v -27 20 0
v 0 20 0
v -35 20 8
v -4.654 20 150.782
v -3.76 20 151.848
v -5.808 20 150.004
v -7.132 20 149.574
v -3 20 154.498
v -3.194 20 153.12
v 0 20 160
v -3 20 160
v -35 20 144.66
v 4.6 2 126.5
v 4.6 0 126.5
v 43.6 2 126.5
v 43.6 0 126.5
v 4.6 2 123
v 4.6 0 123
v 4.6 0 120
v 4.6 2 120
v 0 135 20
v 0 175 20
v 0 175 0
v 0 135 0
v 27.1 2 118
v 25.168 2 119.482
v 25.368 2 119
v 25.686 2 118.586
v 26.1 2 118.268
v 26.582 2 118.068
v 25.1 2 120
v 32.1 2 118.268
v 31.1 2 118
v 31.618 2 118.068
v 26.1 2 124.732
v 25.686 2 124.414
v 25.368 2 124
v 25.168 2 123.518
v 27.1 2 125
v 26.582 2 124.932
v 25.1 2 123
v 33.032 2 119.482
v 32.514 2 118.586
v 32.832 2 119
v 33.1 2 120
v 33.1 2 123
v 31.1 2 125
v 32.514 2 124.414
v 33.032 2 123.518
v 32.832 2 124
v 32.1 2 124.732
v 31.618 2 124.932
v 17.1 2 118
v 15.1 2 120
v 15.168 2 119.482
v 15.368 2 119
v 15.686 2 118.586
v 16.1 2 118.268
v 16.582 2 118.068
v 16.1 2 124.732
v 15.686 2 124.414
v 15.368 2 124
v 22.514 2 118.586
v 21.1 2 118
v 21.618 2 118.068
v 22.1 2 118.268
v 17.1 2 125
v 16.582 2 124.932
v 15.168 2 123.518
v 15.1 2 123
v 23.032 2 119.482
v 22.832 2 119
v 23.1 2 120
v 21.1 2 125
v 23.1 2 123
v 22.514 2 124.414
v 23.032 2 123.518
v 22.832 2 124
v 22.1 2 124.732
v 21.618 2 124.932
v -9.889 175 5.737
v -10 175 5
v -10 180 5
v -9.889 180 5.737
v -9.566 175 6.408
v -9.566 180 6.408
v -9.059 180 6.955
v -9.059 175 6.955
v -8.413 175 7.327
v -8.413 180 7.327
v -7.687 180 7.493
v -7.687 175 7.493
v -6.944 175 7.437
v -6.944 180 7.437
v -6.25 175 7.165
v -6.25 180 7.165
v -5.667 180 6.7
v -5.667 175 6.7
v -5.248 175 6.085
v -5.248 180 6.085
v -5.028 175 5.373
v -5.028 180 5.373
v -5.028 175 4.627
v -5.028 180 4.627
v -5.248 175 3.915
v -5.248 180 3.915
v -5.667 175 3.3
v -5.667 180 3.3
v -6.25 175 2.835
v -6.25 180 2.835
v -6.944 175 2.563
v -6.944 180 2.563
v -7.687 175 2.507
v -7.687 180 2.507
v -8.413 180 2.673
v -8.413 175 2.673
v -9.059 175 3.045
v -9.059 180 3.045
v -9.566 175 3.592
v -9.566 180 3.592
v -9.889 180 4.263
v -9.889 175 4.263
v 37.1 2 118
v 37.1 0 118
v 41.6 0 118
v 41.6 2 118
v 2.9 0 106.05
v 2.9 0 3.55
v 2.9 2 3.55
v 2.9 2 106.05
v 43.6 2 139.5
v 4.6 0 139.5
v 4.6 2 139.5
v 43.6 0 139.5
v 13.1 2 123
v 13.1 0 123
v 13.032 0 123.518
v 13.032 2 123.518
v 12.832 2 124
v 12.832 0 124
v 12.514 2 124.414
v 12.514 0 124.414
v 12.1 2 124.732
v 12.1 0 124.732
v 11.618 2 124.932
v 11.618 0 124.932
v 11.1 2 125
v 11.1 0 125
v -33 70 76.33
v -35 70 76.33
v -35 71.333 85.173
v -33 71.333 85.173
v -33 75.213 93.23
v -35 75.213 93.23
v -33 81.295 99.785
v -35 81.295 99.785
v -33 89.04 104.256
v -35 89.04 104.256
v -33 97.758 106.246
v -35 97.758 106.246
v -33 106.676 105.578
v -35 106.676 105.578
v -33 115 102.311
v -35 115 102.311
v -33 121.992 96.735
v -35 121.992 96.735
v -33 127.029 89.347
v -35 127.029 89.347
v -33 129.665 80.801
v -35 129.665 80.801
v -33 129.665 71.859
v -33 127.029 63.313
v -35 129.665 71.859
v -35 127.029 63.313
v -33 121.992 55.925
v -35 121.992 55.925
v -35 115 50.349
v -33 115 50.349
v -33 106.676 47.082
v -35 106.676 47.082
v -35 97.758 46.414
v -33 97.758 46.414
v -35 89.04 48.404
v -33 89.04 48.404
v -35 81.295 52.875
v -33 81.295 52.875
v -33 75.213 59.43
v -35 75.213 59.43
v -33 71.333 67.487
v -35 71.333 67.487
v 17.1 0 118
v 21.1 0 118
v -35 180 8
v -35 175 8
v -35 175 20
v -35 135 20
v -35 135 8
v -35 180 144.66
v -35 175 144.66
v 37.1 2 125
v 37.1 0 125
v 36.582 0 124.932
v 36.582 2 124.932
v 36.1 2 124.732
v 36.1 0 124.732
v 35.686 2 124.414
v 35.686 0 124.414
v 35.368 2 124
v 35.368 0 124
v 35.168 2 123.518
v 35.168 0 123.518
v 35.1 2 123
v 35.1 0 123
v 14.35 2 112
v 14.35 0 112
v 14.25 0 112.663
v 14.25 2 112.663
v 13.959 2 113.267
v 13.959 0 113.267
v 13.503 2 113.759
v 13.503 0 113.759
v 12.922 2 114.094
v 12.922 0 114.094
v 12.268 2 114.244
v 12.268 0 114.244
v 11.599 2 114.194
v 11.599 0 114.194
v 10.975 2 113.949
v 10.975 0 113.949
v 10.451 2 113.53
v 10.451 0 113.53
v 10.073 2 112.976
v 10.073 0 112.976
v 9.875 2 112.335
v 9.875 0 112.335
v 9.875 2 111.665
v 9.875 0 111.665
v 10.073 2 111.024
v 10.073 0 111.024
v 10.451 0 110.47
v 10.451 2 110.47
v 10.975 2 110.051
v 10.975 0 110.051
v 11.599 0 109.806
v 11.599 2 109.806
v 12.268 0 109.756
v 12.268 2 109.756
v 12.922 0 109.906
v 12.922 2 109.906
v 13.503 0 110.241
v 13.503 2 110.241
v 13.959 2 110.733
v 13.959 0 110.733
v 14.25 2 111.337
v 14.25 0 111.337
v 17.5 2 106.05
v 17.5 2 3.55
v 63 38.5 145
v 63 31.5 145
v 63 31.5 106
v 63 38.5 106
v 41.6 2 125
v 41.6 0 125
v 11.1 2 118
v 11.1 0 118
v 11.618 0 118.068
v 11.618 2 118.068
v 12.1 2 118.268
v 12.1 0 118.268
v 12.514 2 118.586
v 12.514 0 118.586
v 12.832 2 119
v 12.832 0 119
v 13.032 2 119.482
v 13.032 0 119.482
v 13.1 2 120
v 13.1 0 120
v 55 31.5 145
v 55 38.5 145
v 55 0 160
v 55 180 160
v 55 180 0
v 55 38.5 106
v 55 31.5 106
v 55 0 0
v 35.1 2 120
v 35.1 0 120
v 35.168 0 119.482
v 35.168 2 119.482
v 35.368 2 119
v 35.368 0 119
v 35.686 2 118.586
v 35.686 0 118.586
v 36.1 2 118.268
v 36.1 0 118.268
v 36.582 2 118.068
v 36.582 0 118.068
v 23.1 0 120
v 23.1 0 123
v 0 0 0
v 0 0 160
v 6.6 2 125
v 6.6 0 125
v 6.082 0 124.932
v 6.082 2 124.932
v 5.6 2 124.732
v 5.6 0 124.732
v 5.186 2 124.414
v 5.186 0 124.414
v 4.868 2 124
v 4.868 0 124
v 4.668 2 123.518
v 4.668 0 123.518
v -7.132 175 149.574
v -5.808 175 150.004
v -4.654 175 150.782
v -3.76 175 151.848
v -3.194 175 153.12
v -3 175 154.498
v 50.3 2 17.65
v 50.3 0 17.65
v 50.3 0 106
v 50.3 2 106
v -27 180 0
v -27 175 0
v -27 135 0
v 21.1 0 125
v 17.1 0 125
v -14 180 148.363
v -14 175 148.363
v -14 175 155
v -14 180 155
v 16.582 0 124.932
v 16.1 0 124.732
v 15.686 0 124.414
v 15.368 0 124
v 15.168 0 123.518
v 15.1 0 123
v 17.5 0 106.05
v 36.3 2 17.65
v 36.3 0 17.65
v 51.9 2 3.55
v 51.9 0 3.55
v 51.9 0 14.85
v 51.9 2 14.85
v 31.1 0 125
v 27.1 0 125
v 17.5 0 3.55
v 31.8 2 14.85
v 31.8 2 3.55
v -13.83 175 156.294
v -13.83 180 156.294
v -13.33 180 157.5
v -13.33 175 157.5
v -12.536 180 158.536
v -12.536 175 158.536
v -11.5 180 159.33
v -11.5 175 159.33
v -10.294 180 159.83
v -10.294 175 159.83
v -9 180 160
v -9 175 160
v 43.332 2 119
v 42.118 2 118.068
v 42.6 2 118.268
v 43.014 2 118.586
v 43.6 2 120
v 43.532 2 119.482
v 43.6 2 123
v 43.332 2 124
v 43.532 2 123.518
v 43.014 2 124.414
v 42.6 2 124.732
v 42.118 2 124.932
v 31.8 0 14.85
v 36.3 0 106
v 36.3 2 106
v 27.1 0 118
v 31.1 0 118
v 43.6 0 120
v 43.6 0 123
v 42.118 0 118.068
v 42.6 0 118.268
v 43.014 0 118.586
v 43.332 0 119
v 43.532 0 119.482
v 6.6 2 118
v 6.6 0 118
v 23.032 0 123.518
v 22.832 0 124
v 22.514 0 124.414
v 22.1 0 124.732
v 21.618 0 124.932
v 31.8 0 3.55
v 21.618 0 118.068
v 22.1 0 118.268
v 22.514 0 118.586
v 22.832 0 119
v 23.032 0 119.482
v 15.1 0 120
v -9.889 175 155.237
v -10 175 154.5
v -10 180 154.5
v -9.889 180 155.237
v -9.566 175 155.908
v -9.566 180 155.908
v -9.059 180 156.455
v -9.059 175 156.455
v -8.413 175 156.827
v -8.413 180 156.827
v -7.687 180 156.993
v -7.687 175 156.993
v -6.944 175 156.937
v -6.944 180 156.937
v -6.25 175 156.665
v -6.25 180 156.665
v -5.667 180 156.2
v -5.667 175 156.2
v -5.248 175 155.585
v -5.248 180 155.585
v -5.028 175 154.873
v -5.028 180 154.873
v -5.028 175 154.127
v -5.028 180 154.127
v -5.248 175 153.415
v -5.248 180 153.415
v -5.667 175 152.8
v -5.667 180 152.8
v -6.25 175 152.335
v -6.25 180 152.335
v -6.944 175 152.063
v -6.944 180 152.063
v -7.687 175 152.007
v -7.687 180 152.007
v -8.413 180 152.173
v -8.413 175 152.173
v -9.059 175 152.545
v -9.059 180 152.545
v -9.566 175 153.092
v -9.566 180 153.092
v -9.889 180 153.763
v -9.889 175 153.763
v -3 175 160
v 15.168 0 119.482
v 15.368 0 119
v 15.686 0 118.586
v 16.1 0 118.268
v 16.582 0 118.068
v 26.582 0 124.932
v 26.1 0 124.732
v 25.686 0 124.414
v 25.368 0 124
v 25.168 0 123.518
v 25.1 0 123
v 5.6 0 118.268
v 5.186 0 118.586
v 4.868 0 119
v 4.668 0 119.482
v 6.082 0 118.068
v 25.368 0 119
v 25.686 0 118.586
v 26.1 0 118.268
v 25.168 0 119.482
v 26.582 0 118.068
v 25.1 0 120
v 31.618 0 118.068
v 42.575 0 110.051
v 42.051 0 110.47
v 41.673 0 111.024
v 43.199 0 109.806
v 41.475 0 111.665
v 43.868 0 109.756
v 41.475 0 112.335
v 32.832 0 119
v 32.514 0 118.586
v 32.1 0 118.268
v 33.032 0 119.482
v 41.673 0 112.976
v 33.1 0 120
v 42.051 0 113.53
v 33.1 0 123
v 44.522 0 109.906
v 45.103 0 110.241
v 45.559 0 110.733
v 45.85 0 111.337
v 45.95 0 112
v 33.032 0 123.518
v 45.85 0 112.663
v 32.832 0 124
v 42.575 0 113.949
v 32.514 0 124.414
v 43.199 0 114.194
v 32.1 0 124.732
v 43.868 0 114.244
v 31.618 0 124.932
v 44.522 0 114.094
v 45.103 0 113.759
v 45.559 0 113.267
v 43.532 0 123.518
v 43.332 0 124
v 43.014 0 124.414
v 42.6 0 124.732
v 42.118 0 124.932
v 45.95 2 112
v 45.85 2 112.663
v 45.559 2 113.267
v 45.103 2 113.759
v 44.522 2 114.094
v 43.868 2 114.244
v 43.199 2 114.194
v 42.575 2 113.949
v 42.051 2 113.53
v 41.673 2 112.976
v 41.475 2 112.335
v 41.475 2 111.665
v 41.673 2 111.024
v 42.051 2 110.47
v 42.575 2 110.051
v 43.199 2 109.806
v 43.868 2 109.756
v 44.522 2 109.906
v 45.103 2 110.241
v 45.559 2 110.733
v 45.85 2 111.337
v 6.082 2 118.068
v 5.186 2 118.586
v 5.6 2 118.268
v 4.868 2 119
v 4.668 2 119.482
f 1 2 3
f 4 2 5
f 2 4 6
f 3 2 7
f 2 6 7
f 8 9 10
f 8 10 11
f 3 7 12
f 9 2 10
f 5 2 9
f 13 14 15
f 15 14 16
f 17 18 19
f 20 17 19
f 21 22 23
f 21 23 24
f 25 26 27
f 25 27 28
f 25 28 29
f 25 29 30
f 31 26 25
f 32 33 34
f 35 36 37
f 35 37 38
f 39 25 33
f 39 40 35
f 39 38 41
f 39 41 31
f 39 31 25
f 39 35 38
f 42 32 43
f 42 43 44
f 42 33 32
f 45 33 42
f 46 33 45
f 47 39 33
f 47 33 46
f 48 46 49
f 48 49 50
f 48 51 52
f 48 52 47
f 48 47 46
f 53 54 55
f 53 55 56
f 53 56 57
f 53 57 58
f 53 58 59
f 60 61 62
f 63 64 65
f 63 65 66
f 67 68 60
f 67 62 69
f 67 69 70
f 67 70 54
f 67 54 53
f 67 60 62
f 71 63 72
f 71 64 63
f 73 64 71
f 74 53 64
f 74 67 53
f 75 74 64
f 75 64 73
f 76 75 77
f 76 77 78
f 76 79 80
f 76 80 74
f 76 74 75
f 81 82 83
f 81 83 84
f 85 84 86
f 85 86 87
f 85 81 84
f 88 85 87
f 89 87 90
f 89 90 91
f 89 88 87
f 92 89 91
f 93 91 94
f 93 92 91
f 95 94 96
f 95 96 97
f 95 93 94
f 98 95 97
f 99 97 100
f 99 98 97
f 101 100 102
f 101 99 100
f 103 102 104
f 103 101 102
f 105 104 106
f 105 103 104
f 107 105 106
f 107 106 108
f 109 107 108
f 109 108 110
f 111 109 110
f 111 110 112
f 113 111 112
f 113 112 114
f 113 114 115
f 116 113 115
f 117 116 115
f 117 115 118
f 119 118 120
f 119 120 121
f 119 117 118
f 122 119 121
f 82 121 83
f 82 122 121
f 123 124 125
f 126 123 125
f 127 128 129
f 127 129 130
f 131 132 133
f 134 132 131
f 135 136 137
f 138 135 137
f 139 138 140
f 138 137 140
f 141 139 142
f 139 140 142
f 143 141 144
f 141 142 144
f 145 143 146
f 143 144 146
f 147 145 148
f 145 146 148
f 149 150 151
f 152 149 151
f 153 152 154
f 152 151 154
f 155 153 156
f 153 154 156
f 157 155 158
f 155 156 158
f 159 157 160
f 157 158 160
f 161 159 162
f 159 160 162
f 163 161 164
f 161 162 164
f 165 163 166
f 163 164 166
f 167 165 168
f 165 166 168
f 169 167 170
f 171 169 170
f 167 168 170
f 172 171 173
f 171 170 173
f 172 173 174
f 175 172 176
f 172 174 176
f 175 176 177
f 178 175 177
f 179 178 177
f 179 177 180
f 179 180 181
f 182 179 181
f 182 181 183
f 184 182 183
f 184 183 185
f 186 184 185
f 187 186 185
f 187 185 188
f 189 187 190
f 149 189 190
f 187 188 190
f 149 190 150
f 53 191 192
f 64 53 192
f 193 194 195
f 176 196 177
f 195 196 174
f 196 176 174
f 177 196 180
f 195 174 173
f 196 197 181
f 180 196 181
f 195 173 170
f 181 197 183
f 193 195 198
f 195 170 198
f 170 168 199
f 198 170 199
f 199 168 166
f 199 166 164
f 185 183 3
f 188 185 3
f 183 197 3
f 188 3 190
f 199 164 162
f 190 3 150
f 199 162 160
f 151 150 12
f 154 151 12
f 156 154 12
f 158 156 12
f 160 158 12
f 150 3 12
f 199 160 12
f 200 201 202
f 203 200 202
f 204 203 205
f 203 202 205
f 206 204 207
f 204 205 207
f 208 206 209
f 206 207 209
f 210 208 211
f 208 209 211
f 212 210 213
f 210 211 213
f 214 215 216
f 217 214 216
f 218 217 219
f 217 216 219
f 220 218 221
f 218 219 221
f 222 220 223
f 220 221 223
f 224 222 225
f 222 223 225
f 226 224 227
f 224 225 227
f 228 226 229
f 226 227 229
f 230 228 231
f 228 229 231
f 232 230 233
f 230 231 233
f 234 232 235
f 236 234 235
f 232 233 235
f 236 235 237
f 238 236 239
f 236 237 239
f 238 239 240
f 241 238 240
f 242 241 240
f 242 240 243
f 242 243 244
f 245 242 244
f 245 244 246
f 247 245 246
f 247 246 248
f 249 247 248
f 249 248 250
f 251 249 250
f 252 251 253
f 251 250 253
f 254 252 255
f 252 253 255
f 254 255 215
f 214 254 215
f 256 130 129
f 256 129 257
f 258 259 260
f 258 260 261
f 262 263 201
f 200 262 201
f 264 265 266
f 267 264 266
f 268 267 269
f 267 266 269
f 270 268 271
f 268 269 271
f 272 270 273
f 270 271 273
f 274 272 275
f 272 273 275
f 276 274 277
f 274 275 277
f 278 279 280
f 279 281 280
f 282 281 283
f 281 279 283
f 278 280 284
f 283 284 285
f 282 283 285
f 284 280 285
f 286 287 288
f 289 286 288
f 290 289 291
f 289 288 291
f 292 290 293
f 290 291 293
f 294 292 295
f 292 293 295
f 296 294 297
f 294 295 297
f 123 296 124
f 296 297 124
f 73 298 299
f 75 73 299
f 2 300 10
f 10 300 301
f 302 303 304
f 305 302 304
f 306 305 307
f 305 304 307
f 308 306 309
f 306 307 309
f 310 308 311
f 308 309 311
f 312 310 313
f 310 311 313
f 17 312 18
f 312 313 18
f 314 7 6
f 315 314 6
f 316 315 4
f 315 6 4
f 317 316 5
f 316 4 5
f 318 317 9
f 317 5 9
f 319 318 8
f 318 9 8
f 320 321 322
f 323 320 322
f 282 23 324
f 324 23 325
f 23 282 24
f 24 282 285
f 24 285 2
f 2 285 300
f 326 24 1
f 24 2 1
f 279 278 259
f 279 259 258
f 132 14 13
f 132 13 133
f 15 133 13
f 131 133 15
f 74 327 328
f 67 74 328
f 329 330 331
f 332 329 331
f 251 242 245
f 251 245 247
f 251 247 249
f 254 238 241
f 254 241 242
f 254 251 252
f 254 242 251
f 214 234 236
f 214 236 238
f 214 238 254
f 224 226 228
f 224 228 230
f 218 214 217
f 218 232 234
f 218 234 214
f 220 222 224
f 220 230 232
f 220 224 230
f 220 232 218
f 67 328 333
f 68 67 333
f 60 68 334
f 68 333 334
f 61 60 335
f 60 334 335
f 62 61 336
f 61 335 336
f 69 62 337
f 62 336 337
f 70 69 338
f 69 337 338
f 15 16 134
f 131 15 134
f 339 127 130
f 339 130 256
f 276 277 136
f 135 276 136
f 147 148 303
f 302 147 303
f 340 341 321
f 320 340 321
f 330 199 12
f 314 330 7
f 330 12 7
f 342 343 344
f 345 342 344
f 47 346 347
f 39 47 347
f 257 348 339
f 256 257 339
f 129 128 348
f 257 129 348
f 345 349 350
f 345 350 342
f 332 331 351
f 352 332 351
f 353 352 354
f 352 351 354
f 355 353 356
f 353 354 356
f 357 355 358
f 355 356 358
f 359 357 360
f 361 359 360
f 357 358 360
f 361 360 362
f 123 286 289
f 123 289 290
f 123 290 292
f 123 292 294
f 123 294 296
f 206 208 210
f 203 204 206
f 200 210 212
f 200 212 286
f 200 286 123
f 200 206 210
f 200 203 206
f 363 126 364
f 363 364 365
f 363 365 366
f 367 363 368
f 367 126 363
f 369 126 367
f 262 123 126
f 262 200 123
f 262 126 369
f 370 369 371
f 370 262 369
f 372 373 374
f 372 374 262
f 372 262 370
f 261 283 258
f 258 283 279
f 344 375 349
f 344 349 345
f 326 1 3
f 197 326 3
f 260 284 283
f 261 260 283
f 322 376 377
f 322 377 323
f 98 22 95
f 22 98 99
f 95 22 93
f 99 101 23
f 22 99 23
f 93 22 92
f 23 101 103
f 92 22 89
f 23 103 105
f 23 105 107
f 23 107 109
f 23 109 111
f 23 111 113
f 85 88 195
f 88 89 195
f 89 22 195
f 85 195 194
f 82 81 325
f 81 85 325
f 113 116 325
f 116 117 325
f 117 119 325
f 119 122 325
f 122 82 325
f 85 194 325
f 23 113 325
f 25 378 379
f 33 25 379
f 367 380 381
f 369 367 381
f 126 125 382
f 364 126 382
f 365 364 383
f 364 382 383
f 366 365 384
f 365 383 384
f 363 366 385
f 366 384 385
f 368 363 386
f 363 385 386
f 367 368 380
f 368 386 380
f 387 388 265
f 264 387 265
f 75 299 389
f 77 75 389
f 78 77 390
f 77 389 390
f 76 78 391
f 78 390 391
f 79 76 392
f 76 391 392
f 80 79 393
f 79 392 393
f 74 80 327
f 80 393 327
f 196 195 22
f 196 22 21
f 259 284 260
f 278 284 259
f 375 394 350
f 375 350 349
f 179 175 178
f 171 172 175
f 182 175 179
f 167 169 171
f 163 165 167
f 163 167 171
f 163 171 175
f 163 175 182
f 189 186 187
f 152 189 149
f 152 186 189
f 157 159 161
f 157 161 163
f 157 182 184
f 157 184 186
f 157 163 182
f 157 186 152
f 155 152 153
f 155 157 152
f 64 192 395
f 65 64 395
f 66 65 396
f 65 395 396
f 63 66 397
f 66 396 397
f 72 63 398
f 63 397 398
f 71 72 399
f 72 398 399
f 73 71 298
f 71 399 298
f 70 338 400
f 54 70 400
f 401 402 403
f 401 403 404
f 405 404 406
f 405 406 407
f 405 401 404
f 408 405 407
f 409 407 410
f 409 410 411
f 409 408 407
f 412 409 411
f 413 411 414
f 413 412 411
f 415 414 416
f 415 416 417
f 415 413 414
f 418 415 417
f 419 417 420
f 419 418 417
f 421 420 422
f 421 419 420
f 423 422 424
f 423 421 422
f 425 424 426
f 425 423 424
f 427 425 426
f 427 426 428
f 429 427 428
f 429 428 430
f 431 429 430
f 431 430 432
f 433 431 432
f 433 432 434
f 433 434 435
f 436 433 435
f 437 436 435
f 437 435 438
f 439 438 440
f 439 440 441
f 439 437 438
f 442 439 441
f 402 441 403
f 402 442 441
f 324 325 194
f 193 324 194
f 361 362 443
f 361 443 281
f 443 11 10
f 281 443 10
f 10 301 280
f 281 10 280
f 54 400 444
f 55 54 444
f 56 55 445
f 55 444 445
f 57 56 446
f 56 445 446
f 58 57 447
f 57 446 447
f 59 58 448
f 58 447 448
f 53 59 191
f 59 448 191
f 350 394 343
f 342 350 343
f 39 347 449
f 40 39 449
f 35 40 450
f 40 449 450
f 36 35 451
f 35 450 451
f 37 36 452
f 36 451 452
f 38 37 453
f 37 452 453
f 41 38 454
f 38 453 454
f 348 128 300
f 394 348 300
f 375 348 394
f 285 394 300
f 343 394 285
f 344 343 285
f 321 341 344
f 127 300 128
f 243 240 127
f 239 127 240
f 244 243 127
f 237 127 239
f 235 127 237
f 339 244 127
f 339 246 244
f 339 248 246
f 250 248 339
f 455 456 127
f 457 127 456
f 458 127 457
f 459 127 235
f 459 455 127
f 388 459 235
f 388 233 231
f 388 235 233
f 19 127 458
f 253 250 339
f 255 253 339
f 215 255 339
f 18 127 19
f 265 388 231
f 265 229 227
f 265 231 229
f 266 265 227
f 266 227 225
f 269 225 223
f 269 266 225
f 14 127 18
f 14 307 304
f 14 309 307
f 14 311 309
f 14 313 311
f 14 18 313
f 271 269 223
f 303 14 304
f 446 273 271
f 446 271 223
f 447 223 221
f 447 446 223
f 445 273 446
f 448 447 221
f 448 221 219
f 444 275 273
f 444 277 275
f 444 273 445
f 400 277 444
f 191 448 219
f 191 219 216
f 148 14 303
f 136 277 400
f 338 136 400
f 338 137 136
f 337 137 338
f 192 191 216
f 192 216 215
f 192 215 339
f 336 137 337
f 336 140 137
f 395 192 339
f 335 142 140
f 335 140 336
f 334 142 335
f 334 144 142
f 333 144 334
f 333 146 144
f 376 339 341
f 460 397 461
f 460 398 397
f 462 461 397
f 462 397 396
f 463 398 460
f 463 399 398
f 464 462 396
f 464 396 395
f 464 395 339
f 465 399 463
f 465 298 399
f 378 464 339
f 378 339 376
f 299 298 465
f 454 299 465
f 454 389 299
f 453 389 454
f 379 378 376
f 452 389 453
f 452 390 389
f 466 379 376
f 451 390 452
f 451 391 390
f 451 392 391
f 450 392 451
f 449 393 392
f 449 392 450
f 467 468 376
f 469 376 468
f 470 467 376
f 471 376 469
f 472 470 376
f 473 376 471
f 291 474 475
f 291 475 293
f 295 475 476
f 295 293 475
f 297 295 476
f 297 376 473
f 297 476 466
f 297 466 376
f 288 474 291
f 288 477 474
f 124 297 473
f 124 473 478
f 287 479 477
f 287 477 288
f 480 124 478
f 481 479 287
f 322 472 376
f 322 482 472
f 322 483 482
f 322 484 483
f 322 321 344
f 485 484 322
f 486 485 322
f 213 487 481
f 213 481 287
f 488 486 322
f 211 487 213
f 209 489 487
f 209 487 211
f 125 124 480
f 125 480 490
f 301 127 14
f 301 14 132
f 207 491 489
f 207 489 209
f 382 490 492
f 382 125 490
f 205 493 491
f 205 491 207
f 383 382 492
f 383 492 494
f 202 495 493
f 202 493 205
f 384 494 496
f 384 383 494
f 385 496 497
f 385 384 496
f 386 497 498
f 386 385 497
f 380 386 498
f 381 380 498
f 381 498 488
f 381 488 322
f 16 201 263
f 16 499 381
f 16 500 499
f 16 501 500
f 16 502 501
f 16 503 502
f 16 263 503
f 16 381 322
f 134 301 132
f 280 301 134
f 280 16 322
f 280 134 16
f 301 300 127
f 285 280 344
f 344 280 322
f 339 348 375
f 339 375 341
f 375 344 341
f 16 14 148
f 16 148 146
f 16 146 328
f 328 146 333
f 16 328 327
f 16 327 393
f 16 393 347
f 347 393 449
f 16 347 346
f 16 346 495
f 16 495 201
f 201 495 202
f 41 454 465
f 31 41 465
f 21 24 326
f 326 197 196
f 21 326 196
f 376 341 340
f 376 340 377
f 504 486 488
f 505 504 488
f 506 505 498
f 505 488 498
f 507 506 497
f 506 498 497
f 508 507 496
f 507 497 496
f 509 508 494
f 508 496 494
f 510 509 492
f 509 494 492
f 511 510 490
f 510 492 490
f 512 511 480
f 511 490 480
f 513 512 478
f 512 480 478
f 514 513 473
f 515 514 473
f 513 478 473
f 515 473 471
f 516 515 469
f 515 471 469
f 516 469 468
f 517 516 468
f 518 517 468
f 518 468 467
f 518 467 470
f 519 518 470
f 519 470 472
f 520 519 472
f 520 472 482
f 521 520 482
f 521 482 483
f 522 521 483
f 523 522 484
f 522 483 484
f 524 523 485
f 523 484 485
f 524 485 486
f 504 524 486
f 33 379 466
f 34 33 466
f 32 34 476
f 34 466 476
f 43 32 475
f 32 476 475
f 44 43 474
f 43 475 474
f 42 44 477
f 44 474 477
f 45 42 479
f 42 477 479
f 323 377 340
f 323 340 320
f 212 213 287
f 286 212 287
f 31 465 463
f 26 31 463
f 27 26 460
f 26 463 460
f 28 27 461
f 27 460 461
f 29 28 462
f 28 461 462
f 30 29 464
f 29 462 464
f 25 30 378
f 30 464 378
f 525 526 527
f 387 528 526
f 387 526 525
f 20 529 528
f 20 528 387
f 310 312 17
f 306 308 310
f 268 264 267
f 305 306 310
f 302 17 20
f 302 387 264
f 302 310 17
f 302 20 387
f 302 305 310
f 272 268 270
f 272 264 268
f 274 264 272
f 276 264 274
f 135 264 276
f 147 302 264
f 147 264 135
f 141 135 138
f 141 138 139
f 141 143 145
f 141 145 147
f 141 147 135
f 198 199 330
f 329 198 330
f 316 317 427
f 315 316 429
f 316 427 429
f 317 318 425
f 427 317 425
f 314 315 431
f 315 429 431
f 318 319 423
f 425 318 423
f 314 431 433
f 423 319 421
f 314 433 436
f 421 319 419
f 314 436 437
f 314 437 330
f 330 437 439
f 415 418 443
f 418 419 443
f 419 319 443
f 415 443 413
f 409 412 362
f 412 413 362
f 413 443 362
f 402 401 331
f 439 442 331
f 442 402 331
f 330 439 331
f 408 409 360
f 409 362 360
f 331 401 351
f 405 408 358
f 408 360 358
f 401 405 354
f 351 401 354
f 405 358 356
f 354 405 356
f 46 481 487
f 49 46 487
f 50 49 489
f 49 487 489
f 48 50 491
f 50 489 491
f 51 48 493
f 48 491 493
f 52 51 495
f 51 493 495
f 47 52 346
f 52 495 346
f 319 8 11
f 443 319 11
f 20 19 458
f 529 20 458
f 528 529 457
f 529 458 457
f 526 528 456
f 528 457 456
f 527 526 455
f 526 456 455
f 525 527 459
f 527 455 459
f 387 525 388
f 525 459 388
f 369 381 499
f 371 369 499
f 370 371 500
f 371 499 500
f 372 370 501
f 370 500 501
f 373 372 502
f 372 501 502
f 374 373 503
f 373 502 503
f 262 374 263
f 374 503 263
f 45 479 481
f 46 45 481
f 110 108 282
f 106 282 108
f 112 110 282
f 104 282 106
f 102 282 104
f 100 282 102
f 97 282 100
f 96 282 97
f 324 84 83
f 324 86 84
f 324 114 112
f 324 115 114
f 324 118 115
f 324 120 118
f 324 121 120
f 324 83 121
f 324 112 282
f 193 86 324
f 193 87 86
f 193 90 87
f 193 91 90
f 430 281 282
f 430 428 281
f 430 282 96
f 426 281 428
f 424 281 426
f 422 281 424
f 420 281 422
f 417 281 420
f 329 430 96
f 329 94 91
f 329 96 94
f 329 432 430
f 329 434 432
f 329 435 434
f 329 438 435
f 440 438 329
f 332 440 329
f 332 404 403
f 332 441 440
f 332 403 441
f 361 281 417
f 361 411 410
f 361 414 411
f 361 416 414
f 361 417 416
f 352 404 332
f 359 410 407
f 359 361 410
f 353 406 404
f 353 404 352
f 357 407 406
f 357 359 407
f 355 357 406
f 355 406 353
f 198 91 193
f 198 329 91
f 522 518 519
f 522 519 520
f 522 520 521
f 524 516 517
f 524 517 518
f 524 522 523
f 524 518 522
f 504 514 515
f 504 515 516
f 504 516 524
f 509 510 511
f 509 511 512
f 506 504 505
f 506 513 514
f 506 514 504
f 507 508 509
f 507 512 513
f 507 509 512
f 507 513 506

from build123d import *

# Parameters (mm, degrees)
F0_W      = 55
F0_H      = 160
F1_DEPTH  = 20
F2_W      = 55
F2_H      = 160
F3_DEPTH  = 155
F4_R      = 2.5
F5_DEPTH  = 5
F6_W      = 7
F6_H      = 39
F7_DEPTH  = 8
F8_W      = 14.6
F8_H      = 102.5
F8_W_2    = 14
F8_H_2    = 88.35
F8_W_3    = 20.1
F8_H_3    = 11.3
F8_W_4    = 39
F8_H_4    = 13
F8_R      = 2.25
F9_DEPTH  = 2
F10_W     = 40
F10_H     = 12
F10_H_2   = 8
F11_DEPTH = 35
F12_R     = 30
F13_DEPTH = 2


with BuildPart() as f1:
    # F0 (on Front) → F1 (new body)
    with BuildSketch(Plane.XZ):
        with Locations((27.5, 80)):
            Rectangle(F0_W, F0_H)
    extrude(amount=-F1_DEPTH)

    # F2 (on face) → F3 (join)
    with BuildSketch(Plane(origin=(0, 20, 0), x_dir=(-1, 0, 0), z_dir=(0, 1, 0))):
        with BuildLine():
            Line((3, 160), (0, 160))
            Line((0, 160), (0, 0))
            Line((0, 0), (27, 0))
            Line((27, 0), (35, 8))
            Line((35, 8), (35, 144.66))
            Line((35, 144.66), (7.131759, 149.573923))
            ThreePointArc((7.131759, 149.573923), (4.169778, 151.284023), (3, 154.497962))
            Line((3, 154.497962), (3, 160))
        make_face()
        with Locations((-27.5, 80)):
            Rectangle(F2_W, F2_H)
    extrude(amount=F3_DEPTH)

    # F4 (on face) → F5 (join)
    with BuildSketch(Plane(origin=(0, 175, 0), x_dir=(-1, 0, 0), z_dir=(0, 1, 0))):
        with BuildLine():
            Line((9, 160), (3, 160))
            Line((3, 160), (3, 154.497962))
            ThreePointArc((3, 154.497962), (4.169778, 151.284023), (7.131759, 149.573923))
            Line((7.131759, 149.573923), (14, 148.362867))
            Line((14, 148.362867), (14, 155))
            ThreePointArc((14, 155), (12.535534, 158.535534), (9, 160))
        make_face()
        with Locations((7.5, 154.5)):
            Circle(F4_R, mode=Mode.SUBTRACT)
        with BuildLine():
            Line((3, 160), (-55, 160))
            Line((-55, 160), (-55, 0))
            Line((-55, 0), (27, 0))
            Line((27, 0), (35, 8))
            Line((35, 8), (35, 144.66))
            Line((35, 144.66), (14, 148.362867))
            Line((14, 148.362867), (7.131759, 149.573923))
            ThreePointArc((7.131759, 149.573923), (4.169778, 151.284023), (3, 154.497962))
            Line((3, 154.497962), (3, 160))
        make_face()
        with Locations((7.5, 5)):
            Circle(F4_R, mode=Mode.SUBTRACT)
    extrude(amount=F5_DEPTH)

    # F6 (on face) → F7 (join)
    with BuildSketch(Plane.YZ.offset(55)):
        with Locations((35, 125.5)):
            Rectangle(F6_W, F6_H)
    extrude(amount=F7_DEPTH)

    # F8 (on face) → F9 (cut)
    with BuildSketch(Plane.XZ):
        with Locations((10.2, 54.8)):
            Rectangle(F8_W, F8_H)
        with Locations((43.3, 61.825)):
            Rectangle(F8_W_2, F8_H_2)
        with Locations((41.85, 9.2)):
            Rectangle(F8_W_3, F8_H_3)
        with Locations((24.1, 133)):
            Rectangle(F8_W_4, F8_H_4)
        with BuildLine():
            Line((11.1, 125), (6.6, 125))
            ThreePointArc((6.6, 125), (5.185786, 124.414214), (4.6, 123))
            Line((4.6, 123), (4.6, 120))
            ThreePointArc((4.6, 120), (5.185786, 118.585786), (6.6, 118))
            Line((6.6, 118), (11.1, 118))
            ThreePointArc((11.1, 118), (12.514214, 118.585786), (13.1, 120))
            Line((13.1, 120), (13.1, 123))
            ThreePointArc((13.1, 123), (12.514214, 124.414214), (11.1, 125))
        make_face()
        with BuildLine():
            ThreePointArc((15.1, 120), (15.685786, 118.585786), (17.1, 118))
            Line((17.1, 118), (21.1, 118))
            ThreePointArc((21.1, 118), (22.514214, 118.585786), (23.1, 120))
            Line((23.1, 120), (23.1, 123))
            ThreePointArc((23.1, 123), (22.514214, 124.414214), (21.1, 125))
            Line((21.1, 125), (17.1, 125))
            ThreePointArc((17.1, 125), (15.685786, 124.414214), (15.1, 123))
            Line((15.1, 123), (15.1, 120))
        make_face()
        with BuildLine():
            ThreePointArc((25.1, 120), (25.685786, 118.585786), (27.1, 118))
            Line((27.1, 118), (31.1, 118))
            ThreePointArc((31.1, 118), (32.514214, 118.585786), (33.1, 120))
            Line((33.1, 120), (33.1, 123))
            ThreePointArc((33.1, 123), (32.514214, 124.414214), (31.1, 125))
            Line((31.1, 125), (27.1, 125))
            ThreePointArc((27.1, 125), (25.685786, 124.414214), (25.1, 123))
            Line((25.1, 123), (25.1, 120))
        make_face()
        with BuildLine():
            ThreePointArc((35.1, 120), (35.685786, 118.585786), (37.1, 118))
            Line((37.1, 118), (41.6, 118))
            ThreePointArc((41.6, 118), (43.014214, 118.585786), (43.6, 120))
            Line((43.6, 120), (43.6, 123))
            ThreePointArc((43.6, 123), (43.014214, 124.414214), (41.6, 125))
            Line((41.6, 125), (37.1, 125))
            ThreePointArc((37.1, 125), (35.685786, 124.414214), (35.1, 123))
            Line((35.1, 123), (35.1, 120))
        make_face()
        with Locations((43.7, 112)):
            Circle(F8_R)
        with Locations((12.1, 112)):
            Circle(F8_R)
    extrude(amount=-F9_DEPTH, mode=Mode.SUBTRACT)

    # F10 (on face) → F11 (cut)
    with BuildSketch(Plane(origin=(-35, 0, 0), x_dir=(0, -1, 0), z_dir=(-1, 0, 0))):
        with Locations((-155, 14)):
            Rectangle(F10_W, F10_H)
        with Locations((-155, 4)):
            Rectangle(F10_W, F10_H_2)
    extrude(amount=-F11_DEPTH, mode=Mode.SUBTRACT)

    # F12 (on face) → F13 (cut)
    with BuildSketch(Plane(origin=(-35, 0, 0), x_dir=(0, -1, 0), z_dir=(-1, 0, 0))):
        with Locations((-100, 76.33)):
            Circle(F12_R)
    extrude(amount=-F13_DEPTH, mode=Mode.SUBTRACT)


solid = f1.part
